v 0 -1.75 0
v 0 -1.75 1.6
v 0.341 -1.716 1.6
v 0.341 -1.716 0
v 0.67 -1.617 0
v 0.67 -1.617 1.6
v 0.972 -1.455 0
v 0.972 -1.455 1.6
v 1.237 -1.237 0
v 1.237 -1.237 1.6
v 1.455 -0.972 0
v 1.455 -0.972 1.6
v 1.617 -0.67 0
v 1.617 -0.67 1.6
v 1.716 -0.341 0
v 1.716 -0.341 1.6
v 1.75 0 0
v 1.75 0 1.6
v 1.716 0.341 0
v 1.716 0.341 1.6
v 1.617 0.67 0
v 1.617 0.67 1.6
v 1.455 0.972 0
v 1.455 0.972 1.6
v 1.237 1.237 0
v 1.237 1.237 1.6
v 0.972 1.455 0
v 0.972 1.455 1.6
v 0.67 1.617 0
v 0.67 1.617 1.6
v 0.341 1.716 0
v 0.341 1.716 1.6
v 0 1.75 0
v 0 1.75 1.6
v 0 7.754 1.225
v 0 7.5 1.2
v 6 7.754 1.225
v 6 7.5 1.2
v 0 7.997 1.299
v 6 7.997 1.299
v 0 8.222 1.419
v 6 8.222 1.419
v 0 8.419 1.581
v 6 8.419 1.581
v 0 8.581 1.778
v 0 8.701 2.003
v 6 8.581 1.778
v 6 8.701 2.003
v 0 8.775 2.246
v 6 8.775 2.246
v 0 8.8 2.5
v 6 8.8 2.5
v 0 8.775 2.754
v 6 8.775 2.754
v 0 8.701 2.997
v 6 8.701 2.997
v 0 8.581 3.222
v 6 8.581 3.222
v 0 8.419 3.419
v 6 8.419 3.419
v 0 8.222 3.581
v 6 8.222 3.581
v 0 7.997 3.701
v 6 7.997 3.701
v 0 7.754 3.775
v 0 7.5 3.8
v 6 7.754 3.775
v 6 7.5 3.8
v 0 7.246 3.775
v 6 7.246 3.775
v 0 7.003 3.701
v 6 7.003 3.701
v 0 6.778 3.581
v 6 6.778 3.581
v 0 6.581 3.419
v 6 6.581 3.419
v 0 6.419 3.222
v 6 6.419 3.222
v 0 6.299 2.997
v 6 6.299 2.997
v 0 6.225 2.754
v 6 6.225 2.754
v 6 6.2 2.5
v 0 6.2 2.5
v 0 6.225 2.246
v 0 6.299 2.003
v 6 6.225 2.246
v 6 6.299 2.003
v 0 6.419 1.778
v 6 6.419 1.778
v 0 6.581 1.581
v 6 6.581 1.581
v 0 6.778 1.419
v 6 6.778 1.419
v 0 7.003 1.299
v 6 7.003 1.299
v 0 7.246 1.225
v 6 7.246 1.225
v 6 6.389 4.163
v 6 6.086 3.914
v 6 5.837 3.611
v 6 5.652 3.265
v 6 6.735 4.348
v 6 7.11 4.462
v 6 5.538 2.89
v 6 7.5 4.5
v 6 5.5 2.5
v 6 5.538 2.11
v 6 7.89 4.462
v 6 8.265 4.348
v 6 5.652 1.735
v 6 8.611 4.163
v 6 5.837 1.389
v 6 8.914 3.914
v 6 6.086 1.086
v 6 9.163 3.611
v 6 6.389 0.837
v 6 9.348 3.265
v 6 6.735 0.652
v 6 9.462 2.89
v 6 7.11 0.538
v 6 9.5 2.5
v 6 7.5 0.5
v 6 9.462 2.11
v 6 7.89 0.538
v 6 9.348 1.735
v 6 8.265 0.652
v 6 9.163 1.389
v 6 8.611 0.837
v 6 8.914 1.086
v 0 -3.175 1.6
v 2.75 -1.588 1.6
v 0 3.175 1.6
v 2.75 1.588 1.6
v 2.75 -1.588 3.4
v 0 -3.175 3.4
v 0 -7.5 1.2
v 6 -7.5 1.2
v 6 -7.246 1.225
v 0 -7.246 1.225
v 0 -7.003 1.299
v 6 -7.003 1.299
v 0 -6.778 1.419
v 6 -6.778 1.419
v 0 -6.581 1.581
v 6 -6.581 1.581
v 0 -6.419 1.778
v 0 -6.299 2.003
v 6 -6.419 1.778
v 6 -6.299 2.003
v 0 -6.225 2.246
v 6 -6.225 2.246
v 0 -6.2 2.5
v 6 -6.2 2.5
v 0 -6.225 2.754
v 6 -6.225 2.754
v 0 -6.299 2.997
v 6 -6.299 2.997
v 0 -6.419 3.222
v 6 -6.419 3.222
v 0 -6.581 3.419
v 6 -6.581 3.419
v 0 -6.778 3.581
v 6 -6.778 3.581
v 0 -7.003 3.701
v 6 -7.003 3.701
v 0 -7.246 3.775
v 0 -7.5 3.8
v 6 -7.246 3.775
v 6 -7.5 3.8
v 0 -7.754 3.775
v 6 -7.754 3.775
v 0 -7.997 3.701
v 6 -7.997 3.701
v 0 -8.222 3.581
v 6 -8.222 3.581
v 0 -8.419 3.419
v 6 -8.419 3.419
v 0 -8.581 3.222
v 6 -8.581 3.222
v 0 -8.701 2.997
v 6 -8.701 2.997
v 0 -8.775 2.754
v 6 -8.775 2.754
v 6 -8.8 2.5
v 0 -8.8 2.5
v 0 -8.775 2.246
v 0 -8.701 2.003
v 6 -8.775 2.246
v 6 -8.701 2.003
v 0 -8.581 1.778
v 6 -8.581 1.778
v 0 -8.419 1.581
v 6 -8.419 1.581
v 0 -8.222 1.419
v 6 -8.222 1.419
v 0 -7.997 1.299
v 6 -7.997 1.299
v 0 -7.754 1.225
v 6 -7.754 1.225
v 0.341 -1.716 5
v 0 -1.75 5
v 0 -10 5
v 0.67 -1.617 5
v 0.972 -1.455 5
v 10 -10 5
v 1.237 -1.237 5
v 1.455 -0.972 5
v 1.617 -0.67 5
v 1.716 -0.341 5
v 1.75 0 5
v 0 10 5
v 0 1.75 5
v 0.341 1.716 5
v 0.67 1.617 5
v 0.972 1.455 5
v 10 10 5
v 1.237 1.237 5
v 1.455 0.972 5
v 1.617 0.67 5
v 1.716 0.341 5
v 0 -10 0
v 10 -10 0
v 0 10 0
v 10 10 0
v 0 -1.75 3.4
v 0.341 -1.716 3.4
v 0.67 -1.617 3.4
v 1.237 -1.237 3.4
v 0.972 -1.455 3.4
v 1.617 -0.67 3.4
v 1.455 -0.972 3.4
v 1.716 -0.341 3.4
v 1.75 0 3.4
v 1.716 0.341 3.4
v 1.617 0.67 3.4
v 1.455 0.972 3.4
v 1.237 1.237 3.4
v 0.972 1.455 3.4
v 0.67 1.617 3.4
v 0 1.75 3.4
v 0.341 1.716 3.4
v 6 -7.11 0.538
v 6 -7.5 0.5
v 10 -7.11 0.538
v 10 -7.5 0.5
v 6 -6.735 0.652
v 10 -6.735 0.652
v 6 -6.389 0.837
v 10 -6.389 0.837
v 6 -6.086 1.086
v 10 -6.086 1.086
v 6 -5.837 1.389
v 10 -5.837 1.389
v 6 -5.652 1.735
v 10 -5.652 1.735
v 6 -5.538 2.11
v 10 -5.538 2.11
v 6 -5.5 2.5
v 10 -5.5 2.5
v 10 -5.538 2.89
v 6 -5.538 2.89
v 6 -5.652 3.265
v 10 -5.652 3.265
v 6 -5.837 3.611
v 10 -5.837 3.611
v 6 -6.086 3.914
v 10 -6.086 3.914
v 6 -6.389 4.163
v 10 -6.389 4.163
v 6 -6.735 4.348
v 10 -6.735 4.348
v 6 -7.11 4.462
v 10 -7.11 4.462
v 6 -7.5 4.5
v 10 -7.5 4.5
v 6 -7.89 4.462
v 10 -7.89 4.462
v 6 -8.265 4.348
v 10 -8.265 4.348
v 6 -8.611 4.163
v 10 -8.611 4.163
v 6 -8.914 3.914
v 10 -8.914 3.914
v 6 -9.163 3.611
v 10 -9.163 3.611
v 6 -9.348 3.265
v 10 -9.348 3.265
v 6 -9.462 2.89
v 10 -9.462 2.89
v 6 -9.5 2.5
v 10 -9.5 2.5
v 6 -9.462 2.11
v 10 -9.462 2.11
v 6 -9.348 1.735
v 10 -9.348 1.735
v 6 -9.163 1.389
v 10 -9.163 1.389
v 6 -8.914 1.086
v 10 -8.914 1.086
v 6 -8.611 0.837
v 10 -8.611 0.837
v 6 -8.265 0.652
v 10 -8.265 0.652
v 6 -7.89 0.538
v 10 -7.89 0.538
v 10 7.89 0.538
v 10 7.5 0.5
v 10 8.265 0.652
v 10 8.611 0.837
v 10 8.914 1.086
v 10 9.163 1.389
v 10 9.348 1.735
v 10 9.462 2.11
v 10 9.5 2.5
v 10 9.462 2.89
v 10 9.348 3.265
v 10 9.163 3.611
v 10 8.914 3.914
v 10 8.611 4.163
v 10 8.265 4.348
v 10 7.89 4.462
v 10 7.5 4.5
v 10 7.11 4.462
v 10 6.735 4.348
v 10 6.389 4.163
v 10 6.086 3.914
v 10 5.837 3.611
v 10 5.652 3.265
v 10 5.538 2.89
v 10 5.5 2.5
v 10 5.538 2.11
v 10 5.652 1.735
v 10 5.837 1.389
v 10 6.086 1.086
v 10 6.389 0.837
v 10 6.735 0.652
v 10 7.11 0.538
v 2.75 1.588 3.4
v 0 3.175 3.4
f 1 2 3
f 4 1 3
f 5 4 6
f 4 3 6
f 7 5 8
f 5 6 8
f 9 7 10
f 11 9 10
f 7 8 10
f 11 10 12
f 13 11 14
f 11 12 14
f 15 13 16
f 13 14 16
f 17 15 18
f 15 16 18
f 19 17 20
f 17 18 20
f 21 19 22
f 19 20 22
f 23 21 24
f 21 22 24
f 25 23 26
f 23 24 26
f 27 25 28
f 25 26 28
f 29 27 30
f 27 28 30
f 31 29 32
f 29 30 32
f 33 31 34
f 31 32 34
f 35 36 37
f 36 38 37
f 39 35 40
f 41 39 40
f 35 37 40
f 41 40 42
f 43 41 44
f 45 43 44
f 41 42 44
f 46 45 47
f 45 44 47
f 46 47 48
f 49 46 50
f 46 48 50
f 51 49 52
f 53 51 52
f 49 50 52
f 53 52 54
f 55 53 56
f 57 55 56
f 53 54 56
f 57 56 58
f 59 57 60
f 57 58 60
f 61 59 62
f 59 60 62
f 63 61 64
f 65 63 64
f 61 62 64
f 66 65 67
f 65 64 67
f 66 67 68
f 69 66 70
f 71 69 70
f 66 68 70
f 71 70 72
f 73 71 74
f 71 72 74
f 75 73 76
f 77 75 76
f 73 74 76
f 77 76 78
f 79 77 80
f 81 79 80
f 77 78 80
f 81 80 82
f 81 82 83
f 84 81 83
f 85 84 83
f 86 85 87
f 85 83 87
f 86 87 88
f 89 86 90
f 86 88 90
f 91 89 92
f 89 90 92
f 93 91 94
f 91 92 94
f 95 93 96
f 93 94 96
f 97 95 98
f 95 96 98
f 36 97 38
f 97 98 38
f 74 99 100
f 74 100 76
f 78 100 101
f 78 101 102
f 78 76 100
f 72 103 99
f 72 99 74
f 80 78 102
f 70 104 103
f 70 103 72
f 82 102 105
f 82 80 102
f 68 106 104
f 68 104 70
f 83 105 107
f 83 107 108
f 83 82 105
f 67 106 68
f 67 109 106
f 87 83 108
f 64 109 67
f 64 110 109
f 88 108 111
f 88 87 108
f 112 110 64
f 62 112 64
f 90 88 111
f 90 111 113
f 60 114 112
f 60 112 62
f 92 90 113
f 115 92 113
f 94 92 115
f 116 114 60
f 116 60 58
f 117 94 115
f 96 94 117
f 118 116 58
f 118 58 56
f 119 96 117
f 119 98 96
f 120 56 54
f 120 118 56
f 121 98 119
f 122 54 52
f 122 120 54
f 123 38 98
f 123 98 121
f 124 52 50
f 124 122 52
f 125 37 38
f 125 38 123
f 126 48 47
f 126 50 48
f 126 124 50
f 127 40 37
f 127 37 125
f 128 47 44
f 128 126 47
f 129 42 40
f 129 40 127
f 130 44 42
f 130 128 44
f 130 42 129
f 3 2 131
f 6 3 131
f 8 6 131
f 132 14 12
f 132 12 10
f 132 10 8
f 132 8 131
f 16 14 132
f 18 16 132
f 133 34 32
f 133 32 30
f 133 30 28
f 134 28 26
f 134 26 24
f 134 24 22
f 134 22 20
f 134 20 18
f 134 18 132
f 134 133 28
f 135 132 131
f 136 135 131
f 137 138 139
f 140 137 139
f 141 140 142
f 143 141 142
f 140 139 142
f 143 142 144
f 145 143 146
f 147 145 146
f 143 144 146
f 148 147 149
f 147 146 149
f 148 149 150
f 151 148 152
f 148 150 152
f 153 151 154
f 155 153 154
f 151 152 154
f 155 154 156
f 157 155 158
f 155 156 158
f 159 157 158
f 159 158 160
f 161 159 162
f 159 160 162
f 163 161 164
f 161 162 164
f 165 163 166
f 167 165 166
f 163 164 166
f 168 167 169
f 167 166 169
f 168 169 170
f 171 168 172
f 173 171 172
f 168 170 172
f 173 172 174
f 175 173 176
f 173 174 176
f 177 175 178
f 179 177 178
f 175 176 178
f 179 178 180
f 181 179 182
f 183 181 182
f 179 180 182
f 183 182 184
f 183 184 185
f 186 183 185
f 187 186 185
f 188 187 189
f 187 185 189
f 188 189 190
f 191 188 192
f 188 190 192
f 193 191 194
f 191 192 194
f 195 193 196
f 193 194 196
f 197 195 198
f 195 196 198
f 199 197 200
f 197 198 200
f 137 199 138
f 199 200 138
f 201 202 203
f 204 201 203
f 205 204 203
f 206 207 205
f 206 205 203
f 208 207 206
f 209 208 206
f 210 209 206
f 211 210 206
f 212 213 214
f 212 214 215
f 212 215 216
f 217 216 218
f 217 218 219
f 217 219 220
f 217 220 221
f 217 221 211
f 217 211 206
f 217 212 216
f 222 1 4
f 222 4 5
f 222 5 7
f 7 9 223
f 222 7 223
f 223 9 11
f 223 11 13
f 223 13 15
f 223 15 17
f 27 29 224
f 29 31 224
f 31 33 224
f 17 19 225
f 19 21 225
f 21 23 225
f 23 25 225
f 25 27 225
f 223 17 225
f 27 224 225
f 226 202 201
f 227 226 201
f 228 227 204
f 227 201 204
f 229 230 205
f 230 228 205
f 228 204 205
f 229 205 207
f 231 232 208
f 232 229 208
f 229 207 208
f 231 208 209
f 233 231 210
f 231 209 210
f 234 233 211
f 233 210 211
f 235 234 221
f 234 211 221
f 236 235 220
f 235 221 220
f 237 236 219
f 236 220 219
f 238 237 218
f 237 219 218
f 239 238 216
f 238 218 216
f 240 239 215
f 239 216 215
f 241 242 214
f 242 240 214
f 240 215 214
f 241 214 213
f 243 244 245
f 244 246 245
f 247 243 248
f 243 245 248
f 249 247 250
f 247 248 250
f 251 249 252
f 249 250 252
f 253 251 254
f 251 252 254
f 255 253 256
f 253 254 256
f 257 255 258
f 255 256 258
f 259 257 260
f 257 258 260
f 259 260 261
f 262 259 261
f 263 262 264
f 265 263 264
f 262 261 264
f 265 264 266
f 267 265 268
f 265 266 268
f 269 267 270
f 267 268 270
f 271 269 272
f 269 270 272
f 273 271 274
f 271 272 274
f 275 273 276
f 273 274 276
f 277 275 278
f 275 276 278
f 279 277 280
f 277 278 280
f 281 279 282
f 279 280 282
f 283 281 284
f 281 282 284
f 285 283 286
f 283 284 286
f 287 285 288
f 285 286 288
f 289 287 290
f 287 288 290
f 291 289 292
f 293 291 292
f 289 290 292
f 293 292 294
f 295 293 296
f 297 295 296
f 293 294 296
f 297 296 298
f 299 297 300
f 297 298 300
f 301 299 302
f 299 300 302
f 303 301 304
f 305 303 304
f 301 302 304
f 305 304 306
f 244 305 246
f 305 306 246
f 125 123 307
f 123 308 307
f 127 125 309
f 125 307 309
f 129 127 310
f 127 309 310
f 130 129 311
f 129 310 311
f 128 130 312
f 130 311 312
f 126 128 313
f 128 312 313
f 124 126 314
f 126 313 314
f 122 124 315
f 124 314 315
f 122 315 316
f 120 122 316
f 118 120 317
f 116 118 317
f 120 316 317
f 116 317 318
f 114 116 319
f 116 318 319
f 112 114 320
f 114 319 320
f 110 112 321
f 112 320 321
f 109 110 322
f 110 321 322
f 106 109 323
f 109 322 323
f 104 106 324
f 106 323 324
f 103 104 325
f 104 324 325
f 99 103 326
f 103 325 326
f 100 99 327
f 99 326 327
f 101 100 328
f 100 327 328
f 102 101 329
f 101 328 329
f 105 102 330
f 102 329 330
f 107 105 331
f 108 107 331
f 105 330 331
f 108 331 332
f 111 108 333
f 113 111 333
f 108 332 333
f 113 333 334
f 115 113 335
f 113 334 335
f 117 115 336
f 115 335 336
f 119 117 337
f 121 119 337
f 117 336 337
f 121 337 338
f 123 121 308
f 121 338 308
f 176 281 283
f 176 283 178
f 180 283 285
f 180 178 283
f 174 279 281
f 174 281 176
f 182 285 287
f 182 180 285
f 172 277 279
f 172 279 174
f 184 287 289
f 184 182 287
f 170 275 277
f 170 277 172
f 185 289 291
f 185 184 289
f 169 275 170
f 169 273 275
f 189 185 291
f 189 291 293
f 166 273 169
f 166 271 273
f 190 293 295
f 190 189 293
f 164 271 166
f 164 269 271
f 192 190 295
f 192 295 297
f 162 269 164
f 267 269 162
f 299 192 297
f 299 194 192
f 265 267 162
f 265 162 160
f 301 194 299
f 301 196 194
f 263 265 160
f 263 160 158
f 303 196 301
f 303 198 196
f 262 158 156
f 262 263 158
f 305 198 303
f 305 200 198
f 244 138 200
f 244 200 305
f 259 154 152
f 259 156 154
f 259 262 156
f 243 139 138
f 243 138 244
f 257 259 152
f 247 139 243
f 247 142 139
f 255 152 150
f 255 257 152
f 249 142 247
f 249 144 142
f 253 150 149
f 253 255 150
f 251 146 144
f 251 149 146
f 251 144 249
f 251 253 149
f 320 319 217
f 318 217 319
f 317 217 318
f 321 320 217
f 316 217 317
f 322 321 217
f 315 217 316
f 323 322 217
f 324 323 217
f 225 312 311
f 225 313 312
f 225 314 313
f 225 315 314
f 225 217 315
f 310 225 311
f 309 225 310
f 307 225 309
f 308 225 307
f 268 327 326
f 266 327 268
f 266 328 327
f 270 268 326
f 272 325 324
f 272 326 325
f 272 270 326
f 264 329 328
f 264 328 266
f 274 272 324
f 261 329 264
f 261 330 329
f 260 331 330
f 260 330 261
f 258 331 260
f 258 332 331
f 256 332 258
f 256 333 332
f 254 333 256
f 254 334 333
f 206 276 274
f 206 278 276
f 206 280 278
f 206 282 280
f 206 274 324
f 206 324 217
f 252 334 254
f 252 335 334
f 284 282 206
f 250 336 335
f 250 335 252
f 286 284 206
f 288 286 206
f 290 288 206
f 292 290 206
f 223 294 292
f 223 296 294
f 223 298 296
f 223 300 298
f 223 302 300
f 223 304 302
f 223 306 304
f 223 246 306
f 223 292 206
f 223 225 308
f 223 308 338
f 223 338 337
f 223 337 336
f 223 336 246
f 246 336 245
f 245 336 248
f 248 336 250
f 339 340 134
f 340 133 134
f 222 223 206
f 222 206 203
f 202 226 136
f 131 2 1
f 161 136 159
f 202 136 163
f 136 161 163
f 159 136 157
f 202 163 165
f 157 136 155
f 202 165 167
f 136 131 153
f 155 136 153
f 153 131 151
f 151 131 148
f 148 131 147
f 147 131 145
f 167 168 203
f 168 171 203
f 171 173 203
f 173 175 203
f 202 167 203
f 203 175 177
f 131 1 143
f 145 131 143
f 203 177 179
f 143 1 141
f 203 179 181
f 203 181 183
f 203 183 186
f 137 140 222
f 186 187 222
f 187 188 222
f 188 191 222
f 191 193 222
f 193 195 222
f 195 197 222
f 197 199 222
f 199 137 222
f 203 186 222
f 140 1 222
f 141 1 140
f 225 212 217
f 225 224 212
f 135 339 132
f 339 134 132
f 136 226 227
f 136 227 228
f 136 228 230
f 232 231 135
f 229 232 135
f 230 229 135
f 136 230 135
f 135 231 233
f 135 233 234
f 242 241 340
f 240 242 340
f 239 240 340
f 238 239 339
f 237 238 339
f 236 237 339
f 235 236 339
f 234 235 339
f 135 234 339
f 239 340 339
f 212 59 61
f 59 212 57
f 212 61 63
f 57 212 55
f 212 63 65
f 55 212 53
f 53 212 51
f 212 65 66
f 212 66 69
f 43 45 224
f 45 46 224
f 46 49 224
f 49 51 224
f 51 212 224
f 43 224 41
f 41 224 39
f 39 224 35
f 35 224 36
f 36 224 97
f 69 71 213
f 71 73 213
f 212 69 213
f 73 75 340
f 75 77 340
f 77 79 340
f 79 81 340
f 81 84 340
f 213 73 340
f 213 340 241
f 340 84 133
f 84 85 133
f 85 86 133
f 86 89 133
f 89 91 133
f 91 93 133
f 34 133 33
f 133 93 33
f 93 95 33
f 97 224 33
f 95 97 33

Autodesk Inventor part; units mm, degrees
ref_plane "YZ Plane" through (0, 0, 0) normal (1, 0, 0) x (0, 1, 0)
ref_plane "XZ Plane" through (0, 0, 0) normal (0, 1, 0) x (-1, 0, 0)
ref_plane "XY Plane" through (0, 0, 0) normal (0, 0, 1) x (1, 0, 0)
sketch "Sketch1" plane through (0, 0, 0) normal (0, 0, 1) x (1, 0, 0)
  line L0 (10, -10) -> (-10, -10)
  line L1 (-10, -10) -> (-10, 10)
  line L2 (-10, 10) -> (10, 10)
  line L3 (10, 10) -> (10, -10)
  line L4 (10, -10) -> (-10, 10) construction
  line L5 (-10, -10) -> (10, 10) construction
  line L6 (10, -10) -> (6, -10)
  line L7 (6, 10) -> (10, 10)
  line L8 (10, 10) -> (10, -10)
  line L9 (0, 10) -> (0, -10)
  line L10 (0, -10) -> (0, 10)
  point P0 (0, 0)
  dimension "d0" = 20
  dimension "d1" = 20
extrude "Extrusion1" add sketch "Sketch1" along normal blind 5 contours L0 L9 L2 L3
ref_plane "Work Plane1" through (0, 0, 2.5) normal (0, 0, 1) x (1, 0, 0)
sketch "Sketch2" plane through (0, 0, 2.5) normal (0, 0, 1) x (1, 0, 0)
  line L0 (0, 10) -> (0, -10) projected
  line L1 (0, 3.1754) -> (2.75, 1.5877)
  line L2 (2.75, 1.5877) -> (2.75, -1.5877)
  line L3 (2.75, -1.5877) -> (0, -3.1754)
  line L4 (0, -3.1754) -> (-2.75, -1.5877)
  line L5 (-2.75, -1.5877) -> (-2.75, 1.5877)
  line L6 (-2.75, 1.5877) -> (0, 3.1754)
  point P0 (0, 0)
  point P1 (0, 0)
  dimension "d12" = 5.5
extrude "Extrusion2" cut sketch "Sketch2" along normal mid plane 1.8
sketch "Sketch3" plane through (0, 0, 5) normal (0, 0, 1) x (1, 0, 0)
  circle A0 centre (0, 0) radius 1.75
  dimension "d15" = 3.5
extrude "Extrusion3" cut sketch "Sketch3" against normal blind 8
sketch "Sketch4" plane through (10, -10, 0) normal (1, 0, 0) x (0, 0, -1)
  circle A0 centre (-2.5, 17.5) radius 1.3
  circle A1 centre (-2.5, 2.5) radius 1.3
  line L0 (0, 20) -> (-5, 20) projected
  line L1 (0, 0) -> (-5, 0) projected
  line L2 (0, 0) -> (0, 20) projected
  point P0 (0, 10)
  dimension "d18" = 2.5
  dimension "d19" = 2.5
  dimension "d20" = 2.5
  dimension "d21" = 2.5
  dimension "d22" = 2.6
  dimension "d23" = 2.6
extrude "Extrusion4" cut sketch "Sketch4" against normal blind 25
sketch "Sketch5" plane through (10, -10, 0) normal (1, 0, 0) x (0, 0, -1)
  circle A0 centre (-2.5, 17.5) radius 1.3 projected
  circle A1 centre (-2.5, 17.5) radius 2
  circle A2 centre (-2.5, 2.5) radius 1.3 projected
  circle A3 centre (-2.5, 2.5) radius 2
  point P0 (0, 10)
  dimension "d26" = 4
  dimension "d27" = 4
extrude "Extrusion5" cut sketch "Sketch5" against normal blind 4 contours A0 | A1 | A2 | A3
equation "\"d18\" = d19"
equation "\"d20\" = d19"
equation "\"d21\" = d19"
equation "\"d23\" = d22"
equation "\"d27\" = d26"
properties part number "POMSliderMotor"
